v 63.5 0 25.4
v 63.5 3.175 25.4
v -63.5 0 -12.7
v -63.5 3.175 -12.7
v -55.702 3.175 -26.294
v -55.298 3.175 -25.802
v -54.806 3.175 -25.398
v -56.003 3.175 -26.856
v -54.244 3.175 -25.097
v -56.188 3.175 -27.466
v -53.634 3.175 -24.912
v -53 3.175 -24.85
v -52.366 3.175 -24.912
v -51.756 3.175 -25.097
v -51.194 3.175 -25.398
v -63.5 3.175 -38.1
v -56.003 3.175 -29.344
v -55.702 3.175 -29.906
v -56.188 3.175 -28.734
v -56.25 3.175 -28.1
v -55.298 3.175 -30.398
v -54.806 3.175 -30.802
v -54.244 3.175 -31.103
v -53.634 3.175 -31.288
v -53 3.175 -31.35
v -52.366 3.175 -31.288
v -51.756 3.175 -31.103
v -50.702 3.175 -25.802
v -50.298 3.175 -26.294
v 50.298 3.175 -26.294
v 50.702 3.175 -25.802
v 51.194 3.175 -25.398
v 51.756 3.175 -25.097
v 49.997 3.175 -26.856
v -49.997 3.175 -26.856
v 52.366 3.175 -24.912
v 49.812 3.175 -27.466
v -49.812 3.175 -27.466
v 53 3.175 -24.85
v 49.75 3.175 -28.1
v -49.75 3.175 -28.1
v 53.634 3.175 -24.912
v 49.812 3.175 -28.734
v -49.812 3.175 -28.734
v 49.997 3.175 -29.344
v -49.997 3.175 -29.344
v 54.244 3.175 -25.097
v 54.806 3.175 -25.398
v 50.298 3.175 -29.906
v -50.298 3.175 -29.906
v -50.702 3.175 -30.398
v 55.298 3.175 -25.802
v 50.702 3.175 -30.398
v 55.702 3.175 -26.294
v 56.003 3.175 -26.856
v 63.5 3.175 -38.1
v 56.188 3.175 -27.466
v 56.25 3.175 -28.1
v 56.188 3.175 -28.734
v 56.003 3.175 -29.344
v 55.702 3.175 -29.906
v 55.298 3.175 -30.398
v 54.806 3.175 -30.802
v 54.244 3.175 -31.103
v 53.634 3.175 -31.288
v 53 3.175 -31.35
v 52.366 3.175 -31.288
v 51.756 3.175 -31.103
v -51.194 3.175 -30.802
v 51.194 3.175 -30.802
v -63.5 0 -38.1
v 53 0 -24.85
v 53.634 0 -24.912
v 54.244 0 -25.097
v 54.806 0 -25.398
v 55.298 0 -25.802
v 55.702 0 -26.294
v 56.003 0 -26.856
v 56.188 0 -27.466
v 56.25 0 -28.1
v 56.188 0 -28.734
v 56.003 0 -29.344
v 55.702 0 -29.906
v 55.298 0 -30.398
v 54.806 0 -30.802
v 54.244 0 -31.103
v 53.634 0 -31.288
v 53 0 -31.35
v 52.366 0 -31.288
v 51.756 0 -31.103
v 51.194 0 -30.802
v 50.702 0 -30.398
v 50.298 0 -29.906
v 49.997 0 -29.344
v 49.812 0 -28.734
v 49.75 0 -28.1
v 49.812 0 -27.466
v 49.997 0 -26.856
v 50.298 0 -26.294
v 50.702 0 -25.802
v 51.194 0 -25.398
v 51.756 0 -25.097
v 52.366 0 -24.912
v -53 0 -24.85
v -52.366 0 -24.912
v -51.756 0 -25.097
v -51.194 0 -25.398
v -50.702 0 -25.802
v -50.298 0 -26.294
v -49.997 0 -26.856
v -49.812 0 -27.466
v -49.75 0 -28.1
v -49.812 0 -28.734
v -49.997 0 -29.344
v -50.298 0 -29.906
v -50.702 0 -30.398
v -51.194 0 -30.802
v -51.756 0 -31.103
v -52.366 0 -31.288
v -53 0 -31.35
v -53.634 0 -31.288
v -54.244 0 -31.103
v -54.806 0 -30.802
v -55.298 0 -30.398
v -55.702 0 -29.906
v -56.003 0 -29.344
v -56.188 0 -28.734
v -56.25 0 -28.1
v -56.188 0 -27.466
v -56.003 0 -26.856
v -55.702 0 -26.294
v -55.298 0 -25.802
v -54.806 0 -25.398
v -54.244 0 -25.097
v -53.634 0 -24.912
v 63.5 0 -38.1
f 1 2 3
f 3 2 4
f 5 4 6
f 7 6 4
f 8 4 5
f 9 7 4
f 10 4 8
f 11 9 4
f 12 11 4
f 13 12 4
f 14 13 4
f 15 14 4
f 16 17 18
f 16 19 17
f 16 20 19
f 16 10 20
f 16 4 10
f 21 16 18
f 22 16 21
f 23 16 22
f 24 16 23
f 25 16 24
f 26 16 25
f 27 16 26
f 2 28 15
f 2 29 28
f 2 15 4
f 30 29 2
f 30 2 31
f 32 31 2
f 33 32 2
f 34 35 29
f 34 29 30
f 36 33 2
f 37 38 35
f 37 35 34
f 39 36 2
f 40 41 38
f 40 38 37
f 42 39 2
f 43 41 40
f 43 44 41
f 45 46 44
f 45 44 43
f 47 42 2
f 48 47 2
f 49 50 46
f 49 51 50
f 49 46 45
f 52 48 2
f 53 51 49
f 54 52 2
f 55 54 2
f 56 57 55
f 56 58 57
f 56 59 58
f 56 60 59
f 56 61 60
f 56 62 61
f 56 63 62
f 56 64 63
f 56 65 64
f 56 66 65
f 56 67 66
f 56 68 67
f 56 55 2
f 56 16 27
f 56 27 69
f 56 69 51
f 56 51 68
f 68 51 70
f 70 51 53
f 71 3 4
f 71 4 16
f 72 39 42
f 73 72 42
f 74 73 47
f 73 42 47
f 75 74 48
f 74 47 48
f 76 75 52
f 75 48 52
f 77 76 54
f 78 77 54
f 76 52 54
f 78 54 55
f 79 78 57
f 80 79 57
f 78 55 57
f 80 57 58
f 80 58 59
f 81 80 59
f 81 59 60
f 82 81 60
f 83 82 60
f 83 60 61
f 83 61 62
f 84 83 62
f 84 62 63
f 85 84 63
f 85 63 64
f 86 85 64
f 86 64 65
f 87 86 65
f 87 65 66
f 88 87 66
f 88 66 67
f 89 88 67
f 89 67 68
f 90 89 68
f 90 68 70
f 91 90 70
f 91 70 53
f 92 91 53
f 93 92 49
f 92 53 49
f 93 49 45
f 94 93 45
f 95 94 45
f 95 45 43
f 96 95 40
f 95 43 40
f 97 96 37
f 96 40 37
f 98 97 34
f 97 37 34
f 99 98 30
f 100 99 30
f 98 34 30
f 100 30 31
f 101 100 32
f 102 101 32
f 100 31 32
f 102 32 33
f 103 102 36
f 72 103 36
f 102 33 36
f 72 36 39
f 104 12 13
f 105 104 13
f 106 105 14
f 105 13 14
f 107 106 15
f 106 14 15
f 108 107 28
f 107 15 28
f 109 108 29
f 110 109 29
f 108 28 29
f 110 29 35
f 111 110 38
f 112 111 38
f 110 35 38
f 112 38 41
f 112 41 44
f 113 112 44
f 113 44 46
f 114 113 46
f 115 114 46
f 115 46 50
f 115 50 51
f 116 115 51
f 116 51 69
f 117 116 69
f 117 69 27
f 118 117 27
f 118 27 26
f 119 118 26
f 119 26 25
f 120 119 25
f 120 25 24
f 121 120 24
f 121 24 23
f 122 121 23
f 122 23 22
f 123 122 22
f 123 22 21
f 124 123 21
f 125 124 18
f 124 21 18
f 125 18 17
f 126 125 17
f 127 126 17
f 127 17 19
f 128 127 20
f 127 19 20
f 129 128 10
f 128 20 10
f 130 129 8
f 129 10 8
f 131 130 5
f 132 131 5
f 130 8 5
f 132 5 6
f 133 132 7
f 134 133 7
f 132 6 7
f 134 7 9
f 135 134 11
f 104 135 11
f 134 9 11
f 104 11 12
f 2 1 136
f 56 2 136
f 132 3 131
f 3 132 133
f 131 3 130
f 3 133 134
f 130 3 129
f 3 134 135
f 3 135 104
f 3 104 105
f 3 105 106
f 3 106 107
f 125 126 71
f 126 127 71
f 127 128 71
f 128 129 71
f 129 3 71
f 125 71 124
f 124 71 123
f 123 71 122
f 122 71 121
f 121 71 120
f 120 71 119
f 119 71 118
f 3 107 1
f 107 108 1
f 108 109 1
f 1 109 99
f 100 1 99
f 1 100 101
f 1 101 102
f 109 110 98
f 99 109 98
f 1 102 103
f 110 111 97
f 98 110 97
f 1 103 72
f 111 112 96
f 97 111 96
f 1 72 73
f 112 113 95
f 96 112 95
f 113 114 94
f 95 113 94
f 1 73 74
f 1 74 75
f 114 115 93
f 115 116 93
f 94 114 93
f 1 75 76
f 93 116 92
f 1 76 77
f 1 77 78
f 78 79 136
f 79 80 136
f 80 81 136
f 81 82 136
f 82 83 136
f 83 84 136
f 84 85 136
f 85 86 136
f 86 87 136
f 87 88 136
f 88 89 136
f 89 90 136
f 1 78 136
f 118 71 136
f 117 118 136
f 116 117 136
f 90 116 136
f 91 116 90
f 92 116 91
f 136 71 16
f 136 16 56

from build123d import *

# Parameters (mm, degrees)
SKETCH1_W           = 127
SKETCH1_H           = 76.2
BOSS_EXTRUDE1_DEPTH = 3.175
SKETCH2_R           = 3.25
CUT_EXTRUDE1_DEPTH  = 75.121121315


with BuildPart() as part:
    # Sketch1 → Boss-Extrude1 (new body)
    with BuildSketch(Plane(origin=(0, 0, 0), x_dir=(1, 0, 0), z_dir=(0, 1, 0))):
        Rectangle(SKETCH1_W, SKETCH1_H)
    extrude(amount=BOSS_EXTRUDE1_DEPTH)

    # Sketch2 → Cut-Extrude1 (cut, through all)
    with BuildSketch(Plane(origin=(0, 3.175, 0), x_dir=(1, 0, 0), z_dir=(0, 1, 0))):
        Polygon((63.5, -25.4), (-63.5, 12.7), (-63.5, -38.1), (63.5, -38.1), align=None)
        with Locations(Location((-53, 28.1, 0), (0, 0, 270))):
            Circle(SKETCH2_R)
        with Locations(Location((53, 28.1, 0), (0, 0, 270))):
            Circle(SKETCH2_R)
    extrude(amount=-CUT_EXTRUDE1_DEPTH, mode=Mode.SUBTRACT)


solid = part.part
